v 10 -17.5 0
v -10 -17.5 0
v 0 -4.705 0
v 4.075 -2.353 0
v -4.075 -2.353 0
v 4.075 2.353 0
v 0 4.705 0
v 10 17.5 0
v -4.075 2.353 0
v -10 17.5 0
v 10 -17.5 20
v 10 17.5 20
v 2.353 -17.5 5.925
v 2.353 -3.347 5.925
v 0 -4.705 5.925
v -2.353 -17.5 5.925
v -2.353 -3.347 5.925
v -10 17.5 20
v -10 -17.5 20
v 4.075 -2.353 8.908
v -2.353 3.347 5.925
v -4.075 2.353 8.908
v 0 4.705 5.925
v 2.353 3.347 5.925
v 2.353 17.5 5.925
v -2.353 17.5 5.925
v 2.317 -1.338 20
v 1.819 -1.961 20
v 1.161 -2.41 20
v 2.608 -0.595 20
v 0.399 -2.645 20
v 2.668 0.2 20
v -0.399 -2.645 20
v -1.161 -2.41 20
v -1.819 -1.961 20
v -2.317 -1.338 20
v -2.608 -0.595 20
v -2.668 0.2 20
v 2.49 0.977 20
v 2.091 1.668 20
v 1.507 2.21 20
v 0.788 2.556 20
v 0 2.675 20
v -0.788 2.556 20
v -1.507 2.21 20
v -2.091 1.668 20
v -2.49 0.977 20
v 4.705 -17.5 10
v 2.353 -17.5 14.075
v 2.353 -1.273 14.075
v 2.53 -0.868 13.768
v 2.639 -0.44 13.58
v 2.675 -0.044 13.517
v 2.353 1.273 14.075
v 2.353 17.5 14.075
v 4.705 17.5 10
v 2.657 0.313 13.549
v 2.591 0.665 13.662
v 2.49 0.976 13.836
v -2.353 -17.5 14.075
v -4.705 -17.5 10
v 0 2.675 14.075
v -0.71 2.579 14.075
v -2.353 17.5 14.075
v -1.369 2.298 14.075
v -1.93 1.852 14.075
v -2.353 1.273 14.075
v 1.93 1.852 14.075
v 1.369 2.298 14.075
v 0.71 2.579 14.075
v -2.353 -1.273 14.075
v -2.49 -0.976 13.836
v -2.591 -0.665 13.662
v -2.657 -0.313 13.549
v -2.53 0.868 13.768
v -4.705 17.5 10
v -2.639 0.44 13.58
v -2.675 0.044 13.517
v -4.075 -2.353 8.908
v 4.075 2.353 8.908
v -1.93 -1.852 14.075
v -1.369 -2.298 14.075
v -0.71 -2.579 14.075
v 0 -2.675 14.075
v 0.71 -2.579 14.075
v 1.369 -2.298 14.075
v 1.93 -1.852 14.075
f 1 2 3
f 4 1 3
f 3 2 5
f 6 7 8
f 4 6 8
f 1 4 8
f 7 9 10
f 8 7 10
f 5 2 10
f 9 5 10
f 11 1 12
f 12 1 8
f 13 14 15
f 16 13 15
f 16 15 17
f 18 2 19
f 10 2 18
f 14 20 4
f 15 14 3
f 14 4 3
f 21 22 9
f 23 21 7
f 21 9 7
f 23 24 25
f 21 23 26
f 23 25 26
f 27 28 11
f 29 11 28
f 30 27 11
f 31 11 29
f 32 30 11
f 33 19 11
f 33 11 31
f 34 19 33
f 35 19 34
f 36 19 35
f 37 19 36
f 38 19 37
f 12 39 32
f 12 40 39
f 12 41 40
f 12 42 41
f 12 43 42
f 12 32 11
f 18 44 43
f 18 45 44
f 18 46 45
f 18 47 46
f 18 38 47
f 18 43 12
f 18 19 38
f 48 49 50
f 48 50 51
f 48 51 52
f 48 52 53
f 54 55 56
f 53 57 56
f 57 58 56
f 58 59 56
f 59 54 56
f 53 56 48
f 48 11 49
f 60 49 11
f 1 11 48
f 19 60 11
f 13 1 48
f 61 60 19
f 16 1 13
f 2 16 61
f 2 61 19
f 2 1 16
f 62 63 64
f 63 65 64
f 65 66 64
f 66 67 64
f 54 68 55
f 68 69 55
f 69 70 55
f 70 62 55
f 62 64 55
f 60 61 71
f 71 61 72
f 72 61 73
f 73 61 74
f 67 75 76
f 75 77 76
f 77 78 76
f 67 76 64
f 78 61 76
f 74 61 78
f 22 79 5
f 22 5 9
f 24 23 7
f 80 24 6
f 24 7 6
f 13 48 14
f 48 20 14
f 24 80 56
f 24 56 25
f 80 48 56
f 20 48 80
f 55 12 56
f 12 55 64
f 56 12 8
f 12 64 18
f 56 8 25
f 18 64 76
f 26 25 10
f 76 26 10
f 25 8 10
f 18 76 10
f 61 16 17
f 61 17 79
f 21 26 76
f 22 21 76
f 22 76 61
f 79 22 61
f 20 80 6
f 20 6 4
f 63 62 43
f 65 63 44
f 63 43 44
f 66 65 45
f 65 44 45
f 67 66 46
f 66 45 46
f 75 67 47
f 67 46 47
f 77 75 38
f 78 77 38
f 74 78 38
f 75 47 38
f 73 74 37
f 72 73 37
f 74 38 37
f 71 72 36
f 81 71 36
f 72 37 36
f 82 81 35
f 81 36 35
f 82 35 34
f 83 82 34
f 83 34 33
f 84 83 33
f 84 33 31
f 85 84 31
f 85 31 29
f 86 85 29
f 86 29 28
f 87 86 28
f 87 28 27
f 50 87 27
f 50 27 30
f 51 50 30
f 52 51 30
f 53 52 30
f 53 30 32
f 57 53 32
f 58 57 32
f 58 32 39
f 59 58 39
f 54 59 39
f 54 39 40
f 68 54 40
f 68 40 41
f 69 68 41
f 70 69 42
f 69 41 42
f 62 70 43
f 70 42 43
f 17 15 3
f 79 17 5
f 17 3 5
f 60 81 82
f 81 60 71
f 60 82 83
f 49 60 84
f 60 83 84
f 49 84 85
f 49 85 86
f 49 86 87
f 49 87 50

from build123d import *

# Parameters (mm, degrees)
SKETCH004_W             = 35
SKETCH004_H             = 20
PAD001_DEPTH            = 20
POCKET003_DEPTH         = 100
SKETCH007_R             = 2.675
POCKET004_DEPTH         = 100
POCKET005_DEPTH         = 10
BODY001_PLACEMENT_ANGLE = 90


with BuildPart() as part:
    # Sketch004 → Pad001 (new body)
    with BuildSketch(Plane.XY):
        Rectangle(SKETCH004_W, SKETCH004_H)
    extrude(amount=PAD001_DEPTH)

    # Sketch005 (on Face2 of Pad001) → Pocket003 (cut)
    with BuildSketch(Plane.YZ.offset(17.5)):
        Polygon((2.352702, 14.075), (-2.352702, 14.075), (-4.705405, 10), (-2.352702, 5.925), (2.352702, 5.925), (4.705405, 10), align=None)
    extrude(amount=-POCKET003_DEPTH, mode=Mode.SUBTRACT)

    # Sketch007 (on Face5 of Pocket003) → Pocket004 (cut)
    with BuildSketch(Plane.XY.offset(20)):
        Circle(SKETCH007_R)
    extrude(amount=-POCKET004_DEPTH, mode=Mode.SUBTRACT)

    # Sketch008 (on Face4 of Pocket004) → Pocket005 (cut)
    with BuildSketch(Plane(origin=(0, 0, 0), x_dir=(1, 0, 0), z_dir=(0, 0, -1))):
        Polygon((4.705405, 0), (2.352702, 4.075), (-2.352702, 4.075), (-4.705405, 0), (-2.352702, -4.075), (2.352702, -4.075), align=None)
    extrude(amount=-POCKET005_DEPTH, mode=Mode.SUBTRACT)


with BuildPart() as part_1:
    # Body001 placement: moved
    add(part.part.rotate(Axis((0, 0, 0), (0, 0, 1)), BODY001_PLACEMENT_ANGLE))


solid = part_1.part
